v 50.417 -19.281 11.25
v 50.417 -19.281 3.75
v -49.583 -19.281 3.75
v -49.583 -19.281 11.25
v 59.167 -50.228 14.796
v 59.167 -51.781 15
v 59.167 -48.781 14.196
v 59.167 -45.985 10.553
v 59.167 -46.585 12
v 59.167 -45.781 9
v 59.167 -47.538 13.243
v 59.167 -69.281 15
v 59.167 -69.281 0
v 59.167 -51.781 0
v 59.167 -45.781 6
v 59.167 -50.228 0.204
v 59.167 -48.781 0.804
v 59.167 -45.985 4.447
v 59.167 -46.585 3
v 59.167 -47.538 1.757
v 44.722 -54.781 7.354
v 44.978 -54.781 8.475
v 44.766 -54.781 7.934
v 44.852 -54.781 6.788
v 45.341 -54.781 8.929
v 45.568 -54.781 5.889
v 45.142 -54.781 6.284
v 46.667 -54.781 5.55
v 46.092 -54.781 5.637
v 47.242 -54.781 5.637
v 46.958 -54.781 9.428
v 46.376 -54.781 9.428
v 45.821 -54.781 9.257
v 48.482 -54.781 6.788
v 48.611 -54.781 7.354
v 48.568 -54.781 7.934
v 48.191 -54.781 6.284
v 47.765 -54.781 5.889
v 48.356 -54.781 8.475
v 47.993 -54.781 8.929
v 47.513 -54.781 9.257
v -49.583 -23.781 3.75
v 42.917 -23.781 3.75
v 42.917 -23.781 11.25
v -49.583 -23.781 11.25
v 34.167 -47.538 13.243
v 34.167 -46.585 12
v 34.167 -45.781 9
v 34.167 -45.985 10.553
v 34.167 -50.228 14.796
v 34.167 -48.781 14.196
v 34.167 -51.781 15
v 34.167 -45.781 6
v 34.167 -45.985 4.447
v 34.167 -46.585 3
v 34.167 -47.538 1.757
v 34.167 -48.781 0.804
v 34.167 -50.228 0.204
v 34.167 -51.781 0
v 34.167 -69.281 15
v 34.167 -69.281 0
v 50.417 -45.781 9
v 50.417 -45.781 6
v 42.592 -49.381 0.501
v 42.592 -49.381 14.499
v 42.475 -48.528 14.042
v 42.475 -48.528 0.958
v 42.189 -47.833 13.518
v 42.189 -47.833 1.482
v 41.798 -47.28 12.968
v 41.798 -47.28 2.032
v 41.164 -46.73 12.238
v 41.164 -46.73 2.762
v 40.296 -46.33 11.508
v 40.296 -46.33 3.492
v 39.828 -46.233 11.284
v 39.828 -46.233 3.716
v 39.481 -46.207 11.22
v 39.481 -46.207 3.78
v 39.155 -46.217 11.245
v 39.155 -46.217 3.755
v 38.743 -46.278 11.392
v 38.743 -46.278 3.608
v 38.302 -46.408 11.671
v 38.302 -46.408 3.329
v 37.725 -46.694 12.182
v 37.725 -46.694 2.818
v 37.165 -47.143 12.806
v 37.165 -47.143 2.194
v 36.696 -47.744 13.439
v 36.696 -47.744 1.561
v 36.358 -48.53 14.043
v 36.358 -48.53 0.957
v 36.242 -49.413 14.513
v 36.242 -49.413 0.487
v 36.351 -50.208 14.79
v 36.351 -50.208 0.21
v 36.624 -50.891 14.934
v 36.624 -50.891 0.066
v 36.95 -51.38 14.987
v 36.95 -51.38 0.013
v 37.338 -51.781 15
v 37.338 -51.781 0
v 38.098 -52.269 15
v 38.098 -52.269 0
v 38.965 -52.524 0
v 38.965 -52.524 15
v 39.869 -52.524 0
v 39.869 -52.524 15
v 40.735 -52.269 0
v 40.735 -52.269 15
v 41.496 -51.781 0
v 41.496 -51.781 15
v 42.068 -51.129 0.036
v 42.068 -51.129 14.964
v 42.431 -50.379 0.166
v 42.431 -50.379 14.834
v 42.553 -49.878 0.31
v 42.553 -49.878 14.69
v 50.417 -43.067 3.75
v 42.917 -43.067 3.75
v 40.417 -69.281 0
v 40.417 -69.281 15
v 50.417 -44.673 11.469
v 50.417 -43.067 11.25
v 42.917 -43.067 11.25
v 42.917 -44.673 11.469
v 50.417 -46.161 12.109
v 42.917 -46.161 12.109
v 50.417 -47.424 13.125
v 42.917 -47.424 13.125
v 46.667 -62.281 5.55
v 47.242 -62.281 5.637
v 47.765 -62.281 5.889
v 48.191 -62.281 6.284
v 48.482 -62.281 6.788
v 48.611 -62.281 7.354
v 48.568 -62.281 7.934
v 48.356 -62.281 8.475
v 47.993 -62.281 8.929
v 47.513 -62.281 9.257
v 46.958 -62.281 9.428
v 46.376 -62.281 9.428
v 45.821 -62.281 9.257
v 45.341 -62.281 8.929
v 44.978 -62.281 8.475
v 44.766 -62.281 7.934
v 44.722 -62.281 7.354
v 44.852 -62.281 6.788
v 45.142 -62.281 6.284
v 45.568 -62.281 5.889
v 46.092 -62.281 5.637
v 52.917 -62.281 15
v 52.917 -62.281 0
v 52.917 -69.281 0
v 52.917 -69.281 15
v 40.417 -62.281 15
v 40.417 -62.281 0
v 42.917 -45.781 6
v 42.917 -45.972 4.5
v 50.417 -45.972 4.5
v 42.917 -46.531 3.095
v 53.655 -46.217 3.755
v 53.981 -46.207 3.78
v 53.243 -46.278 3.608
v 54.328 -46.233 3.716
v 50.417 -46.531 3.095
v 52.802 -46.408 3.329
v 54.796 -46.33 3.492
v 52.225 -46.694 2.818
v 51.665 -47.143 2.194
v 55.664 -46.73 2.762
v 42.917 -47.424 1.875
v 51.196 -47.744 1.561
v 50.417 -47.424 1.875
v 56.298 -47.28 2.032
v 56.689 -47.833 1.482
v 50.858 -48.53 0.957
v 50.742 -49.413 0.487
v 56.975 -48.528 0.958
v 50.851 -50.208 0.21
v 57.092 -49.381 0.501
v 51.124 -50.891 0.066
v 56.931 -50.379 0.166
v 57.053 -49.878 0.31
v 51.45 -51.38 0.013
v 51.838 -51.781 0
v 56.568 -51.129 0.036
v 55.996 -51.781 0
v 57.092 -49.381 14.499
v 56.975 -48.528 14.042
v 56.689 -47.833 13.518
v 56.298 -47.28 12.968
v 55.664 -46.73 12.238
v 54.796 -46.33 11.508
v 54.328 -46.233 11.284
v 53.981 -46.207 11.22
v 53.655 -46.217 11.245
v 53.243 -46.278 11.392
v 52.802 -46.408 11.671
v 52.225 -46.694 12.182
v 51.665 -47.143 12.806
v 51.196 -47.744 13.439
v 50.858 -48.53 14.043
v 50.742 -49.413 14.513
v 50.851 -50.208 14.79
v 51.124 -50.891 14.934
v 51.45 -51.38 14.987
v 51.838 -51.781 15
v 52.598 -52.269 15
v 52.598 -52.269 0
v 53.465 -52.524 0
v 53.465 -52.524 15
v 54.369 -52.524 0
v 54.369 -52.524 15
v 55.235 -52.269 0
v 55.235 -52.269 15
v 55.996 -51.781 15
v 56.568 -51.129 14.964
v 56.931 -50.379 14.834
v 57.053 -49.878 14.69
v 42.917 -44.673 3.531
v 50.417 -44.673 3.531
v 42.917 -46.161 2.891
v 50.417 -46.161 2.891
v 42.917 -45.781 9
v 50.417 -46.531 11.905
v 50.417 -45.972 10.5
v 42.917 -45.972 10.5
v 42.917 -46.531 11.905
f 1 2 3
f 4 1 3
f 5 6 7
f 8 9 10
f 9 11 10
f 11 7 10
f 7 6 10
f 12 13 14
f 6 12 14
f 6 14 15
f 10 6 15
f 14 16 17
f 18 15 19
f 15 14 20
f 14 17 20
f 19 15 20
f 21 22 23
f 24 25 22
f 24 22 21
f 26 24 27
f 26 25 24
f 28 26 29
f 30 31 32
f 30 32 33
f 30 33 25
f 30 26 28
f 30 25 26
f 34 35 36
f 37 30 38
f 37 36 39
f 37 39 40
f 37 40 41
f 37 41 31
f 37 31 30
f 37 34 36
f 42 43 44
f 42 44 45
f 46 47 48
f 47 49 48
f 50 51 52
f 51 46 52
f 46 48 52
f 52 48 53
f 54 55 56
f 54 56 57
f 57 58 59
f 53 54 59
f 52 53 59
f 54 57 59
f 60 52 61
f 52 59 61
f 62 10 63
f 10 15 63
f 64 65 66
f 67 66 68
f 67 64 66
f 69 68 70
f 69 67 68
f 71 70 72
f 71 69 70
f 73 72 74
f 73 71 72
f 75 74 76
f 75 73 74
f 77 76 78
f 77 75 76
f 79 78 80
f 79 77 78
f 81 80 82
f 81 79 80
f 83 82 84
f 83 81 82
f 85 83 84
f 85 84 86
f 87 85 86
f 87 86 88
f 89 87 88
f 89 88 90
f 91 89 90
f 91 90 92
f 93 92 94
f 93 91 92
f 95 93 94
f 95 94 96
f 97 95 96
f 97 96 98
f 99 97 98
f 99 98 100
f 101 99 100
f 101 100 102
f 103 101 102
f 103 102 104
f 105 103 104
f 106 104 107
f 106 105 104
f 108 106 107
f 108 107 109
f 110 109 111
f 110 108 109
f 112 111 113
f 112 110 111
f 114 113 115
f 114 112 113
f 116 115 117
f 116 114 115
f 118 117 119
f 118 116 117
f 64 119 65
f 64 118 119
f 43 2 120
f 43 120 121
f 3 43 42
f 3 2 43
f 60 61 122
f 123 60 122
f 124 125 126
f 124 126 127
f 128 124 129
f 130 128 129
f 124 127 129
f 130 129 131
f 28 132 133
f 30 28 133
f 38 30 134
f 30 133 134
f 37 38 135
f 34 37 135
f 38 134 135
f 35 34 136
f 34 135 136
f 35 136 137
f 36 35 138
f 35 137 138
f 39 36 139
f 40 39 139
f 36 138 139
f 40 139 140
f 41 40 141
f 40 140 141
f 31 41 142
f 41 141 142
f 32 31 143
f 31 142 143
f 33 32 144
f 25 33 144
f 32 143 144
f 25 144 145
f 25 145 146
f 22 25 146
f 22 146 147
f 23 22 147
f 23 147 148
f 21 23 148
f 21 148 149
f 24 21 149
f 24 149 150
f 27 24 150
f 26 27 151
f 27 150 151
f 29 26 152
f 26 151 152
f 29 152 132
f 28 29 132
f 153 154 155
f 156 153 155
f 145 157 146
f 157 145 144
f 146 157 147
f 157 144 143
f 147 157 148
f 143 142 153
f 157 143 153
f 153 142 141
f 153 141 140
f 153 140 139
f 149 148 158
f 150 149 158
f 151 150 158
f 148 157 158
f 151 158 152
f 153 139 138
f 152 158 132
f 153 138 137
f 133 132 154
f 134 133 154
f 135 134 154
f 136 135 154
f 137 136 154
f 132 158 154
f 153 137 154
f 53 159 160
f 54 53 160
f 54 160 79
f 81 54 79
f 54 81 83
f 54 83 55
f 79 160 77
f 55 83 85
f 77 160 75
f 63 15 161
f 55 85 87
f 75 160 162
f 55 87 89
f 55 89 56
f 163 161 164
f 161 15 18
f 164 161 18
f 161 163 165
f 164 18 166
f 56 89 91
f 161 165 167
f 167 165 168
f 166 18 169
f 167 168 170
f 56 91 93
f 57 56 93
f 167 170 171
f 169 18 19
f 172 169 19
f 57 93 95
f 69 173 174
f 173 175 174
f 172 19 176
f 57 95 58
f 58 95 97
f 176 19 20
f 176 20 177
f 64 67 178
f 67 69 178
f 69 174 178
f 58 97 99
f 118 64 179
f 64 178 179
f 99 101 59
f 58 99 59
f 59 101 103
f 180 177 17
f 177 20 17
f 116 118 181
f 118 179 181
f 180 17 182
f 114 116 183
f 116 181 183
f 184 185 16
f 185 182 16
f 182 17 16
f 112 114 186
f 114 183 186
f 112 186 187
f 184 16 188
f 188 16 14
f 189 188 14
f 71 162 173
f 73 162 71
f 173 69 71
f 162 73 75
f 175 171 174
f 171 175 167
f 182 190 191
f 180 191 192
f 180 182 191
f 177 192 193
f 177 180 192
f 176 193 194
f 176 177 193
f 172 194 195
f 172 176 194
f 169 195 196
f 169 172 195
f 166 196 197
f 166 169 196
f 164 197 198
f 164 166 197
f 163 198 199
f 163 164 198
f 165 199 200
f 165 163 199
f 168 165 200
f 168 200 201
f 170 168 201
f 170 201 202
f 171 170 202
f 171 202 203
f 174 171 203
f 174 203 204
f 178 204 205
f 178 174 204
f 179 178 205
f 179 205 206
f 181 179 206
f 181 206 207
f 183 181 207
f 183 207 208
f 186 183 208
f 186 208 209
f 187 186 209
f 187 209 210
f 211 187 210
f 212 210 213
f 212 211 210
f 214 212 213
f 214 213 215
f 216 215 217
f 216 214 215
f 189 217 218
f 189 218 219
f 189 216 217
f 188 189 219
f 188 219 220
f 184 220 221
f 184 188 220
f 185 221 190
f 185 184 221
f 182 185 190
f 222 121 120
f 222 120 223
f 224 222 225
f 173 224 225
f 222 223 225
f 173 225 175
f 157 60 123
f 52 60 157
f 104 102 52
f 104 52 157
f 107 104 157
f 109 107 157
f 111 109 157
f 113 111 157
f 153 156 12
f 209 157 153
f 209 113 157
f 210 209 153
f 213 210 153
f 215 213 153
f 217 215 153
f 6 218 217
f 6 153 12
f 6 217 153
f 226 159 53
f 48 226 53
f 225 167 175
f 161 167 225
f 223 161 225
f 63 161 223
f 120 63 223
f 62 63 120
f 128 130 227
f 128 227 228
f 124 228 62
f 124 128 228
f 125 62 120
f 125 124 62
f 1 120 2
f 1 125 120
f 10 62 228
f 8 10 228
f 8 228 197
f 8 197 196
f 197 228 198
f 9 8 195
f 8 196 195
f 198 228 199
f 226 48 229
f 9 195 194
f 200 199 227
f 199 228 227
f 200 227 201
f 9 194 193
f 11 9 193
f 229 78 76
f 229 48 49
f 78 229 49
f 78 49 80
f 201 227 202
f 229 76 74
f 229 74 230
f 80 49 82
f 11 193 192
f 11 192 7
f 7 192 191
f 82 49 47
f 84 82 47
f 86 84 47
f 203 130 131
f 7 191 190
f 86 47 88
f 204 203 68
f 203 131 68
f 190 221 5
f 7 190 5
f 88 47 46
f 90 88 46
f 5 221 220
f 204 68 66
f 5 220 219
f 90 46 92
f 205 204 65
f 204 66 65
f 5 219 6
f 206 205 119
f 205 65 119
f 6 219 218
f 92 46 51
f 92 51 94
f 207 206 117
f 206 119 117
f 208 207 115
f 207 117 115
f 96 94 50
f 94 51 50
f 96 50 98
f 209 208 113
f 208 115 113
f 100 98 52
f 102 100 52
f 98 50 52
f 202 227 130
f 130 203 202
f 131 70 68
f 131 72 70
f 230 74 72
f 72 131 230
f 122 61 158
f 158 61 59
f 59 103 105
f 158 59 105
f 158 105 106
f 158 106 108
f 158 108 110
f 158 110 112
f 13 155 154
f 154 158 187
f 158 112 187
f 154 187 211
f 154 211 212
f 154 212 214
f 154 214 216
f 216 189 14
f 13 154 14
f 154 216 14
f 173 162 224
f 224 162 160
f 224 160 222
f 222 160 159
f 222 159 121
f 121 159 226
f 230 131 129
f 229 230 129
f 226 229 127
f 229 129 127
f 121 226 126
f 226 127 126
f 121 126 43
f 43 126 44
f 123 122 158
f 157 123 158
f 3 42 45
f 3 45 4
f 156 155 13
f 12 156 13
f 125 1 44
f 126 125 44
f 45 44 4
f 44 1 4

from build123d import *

# Parameters (mm, degrees)
SKETCH1_R           = 3.175
PUSHER_BASE_DEPTH   = 15
SKETCH3_R           = 1.95
SCREW_HOLE_DEPTH    = 7.5
SKETCH6_W           = 7.5
SKETCH6_H           = 26.5
PUSHER_HEAD_DEPTH   = 3.75
FILLET1_R           = 6
FILLET5_R           = 6
FILLET6_R           = 6
SKETCH8_W           = 92.5
SKETCH8_H           = 4.5
BOSS_EXTRUDE1_DEPTH = 7.5


with BuildPart() as part:
    # Sketch1 → pusher base (new body)
    with BuildSketch(Plane.XY):
        Polygon((59.166899441, -45.781018283), (51.666899441, -45.781018283), (41.666899441, -45.781018283), (34.166899441, -45.781018283), (34.166899441, -69.281018283), (40.416899441, -69.281018283), (40.416899441, -62.281018283), (52.916899441, -62.281018283), (52.916899441, -69.281018283), (59.166899441, -69.281018283), align=None)
        with Locations((39.416899441, -49.381018283)):
            Circle(SKETCH1_R, mode=Mode.SUBTRACT)
        with Locations((53.916899441, -49.381018283)):
            Circle(SKETCH1_R, mode=Mode.SUBTRACT)
    extrude(amount=PUSHER_BASE_DEPTH)

    # Sketch3 → screw hole (cut)
    with BuildSketch(Plane.XZ.offset(62.281018283)):
        with Locations(Location((46.666899441, 7.5, 0), (0, 0, 270))):
            Circle(SKETCH3_R)
    extrude(amount=-SCREW_HOLE_DEPTH, mode=Mode.SUBTRACT)

    # Sketch6 → pusher head (add, symmetric)
    with BuildSketch(Plane.XY.offset(7.5)):
        with Locations((46.666899441, -32.531018283)):
            Rectangle(SKETCH6_W, SKETCH6_H)
    extrude(amount=PUSHER_HEAD_DEPTH, both=True)

    # Fillet1
    # the kernel refuses this fillet: 6 mm, written as the material it takes off along each edge
    with BuildSketch(Plane(origin=(74.166899441, -45.781018283, 0), x_dir=(0, 0, 1), z_dir=(-1, 0, 0))) as fillet1_piece_1_section:
        with BuildLine():
            CenterArc((FILLET1_R, -FILLET1_R), FILLET1_R, 90, 90)
            Line((0, -FILLET1_R), (0, 0))
            Line((0, 0), (FILLET1_R, 0))
        make_face()
    fillet1_piece_1 = extrude(amount=55, mode=Mode.PRIVATE)
    fillet1_piece_1 = split(fillet1_piece_1, bisect_by=Plane(origin=(62.291899441, -45.824840722, 3.75), z_dir=(0, 0, 1)), keep=Keep.TOP, mode=Mode.PRIVATE)
    fillet1_piece_1 = split(fillet1_piece_1, bisect_by=Plane(origin=(50.416899441, -45.824840722, 4.566140917), z_dir=(1, 0, 0)), keep=Keep.TOP, mode=Mode.PRIVATE)
    add(fillet1_piece_1, mode=Mode.SUBTRACT)
    with BuildSketch(Plane(origin=(74.166899441, -45.781018283, 0), x_dir=(0, 0, 1), z_dir=(-1, 0, 0))) as fillet1_piece_2_section:
        with BuildLine():
            CenterArc((FILLET1_R, -FILLET1_R), FILLET1_R, 90, 90)
            Line((0, -FILLET1_R), (0, 0))
            Line((0, 0), (FILLET1_R, 0))
        make_face()
    fillet1_piece_2 = extrude(amount=55, mode=Mode.PRIVATE)
    fillet1_piece_2 = split(fillet1_piece_2, bisect_by=Plane(origin=(62.291899441, -47.230240291, 3.75), z_dir=(0, 0, -1)), keep=Keep.TOP, mode=Mode.PRIVATE)
    fillet1_piece_2 = split(fillet1_piece_2, bisect_by=Plane(origin=(50.416899441, -47.230240291, 1.136674626), z_dir=(1, 0, 0)), keep=Keep.TOP, mode=Mode.PRIVATE)
    add(fillet1_piece_2, mode=Mode.SUBTRACT)
    with BuildSketch(Plane(origin=(74.166899441, -45.781018283, 0), x_dir=(0, 0, 1), z_dir=(-1, 0, 0))) as fillet1_piece_3_section:
        with BuildLine():
            CenterArc((FILLET1_R, -FILLET1_R), FILLET1_R, 90, 90)
            Line((0, -FILLET1_R), (0, 0))
            Line((0, 0), (FILLET1_R, 0))
        make_face()
    fillet1_piece_3 = extrude(amount=55, mode=Mode.PRIVATE)
    fillet1_piece_3 = split(fillet1_piece_3, bisect_by=Plane(origin=(46.666899441, -47.230240291, 3.75), z_dir=(0, 0, -1)), keep=Keep.TOP, mode=Mode.PRIVATE)
    fillet1_piece_3 = split(fillet1_piece_3, bisect_by=Plane(origin=(50.416899441, -47.230240291, 1.136674626), z_dir=(-1, 0, 0)), keep=Keep.TOP, mode=Mode.PRIVATE)
    fillet1_piece_3 = split(fillet1_piece_3, bisect_by=Plane(origin=(42.916899441, -47.230240291, 1.136674626), z_dir=(1, 0, 0)), keep=Keep.TOP, mode=Mode.PRIVATE)
    add(fillet1_piece_3, mode=Mode.SUBTRACT)
    with BuildSketch(Plane(origin=(74.166899441, -45.781018283, 0), x_dir=(0, 0, 1), z_dir=(-1, 0, 0))) as fillet1_piece_4_section:
        with BuildLine():
            CenterArc((FILLET1_R, -FILLET1_R), FILLET1_R, 90, 90)
            Line((0, -FILLET1_R), (0, 0))
            Line((0, 0), (FILLET1_R, 0))
        make_face()
    fillet1_piece_4 = extrude(amount=55, mode=Mode.PRIVATE)
    fillet1_piece_4 = split(fillet1_piece_4, bisect_by=Plane(origin=(31.041899441, -45.824840722, 3.75), z_dir=(0, 0, 1)), keep=Keep.TOP, mode=Mode.PRIVATE)
    fillet1_piece_4 = split(fillet1_piece_4, bisect_by=Plane(origin=(42.916899441, -45.824840722, 4.566140917), z_dir=(-1, 0, 0)), keep=Keep.TOP, mode=Mode.PRIVATE)
    add(fillet1_piece_4, mode=Mode.SUBTRACT)
    with BuildSketch(Plane(origin=(74.166899441, -45.781018283, 0), x_dir=(0, 0, 1), z_dir=(-1, 0, 0))) as fillet1_piece_5_section:
        with BuildLine():
            CenterArc((FILLET1_R, -FILLET1_R), FILLET1_R, 90, 90)
            Line((0, -FILLET1_R), (0, 0))
            Line((0, 0), (FILLET1_R, 0))
        make_face()
    fillet1_piece_5 = extrude(amount=55, mode=Mode.PRIVATE)
    fillet1_piece_5 = split(fillet1_piece_5, bisect_by=Plane(origin=(31.041899441, -47.230240291, 3.75), z_dir=(0, 0, -1)), keep=Keep.TOP, mode=Mode.PRIVATE)
    fillet1_piece_5 = split(fillet1_piece_5, bisect_by=Plane(origin=(42.916899441, -47.230240291, 1.136674626), z_dir=(-1, 0, 0)), keep=Keep.TOP, mode=Mode.PRIVATE)
    add(fillet1_piece_5, mode=Mode.SUBTRACT)
    with BuildSketch(Plane(origin=(19.166899441, -45.781018283, 15), x_dir=(0, 0, -1), z_dir=(1, 0, 0))) as fillet1_piece_6_section:
        with BuildLine():
            CenterArc((FILLET1_R, -FILLET1_R), FILLET1_R, 90, 90)
            Line((0, -FILLET1_R), (0, 0))
            Line((0, 0), (FILLET1_R, 0))
        make_face()
    fillet1_piece_6 = extrude(amount=55, mode=Mode.PRIVATE)
    fillet1_piece_6 = split(fillet1_piece_6, bisect_by=Plane(origin=(31.041899441, -45.824840722, 11.25), z_dir=(0, 0, -1)), keep=Keep.TOP, mode=Mode.PRIVATE)
    fillet1_piece_6 = split(fillet1_piece_6, bisect_by=Plane(origin=(42.916899441, -45.824840722, 10.433859083), z_dir=(-1, 0, 0)), keep=Keep.TOP, mode=Mode.PRIVATE)
    add(fillet1_piece_6, mode=Mode.SUBTRACT)
    with BuildSketch(Plane(origin=(19.166899441, -45.781018283, 15), x_dir=(0, 0, -1), z_dir=(1, 0, 0))) as fillet1_piece_7_section:
        with BuildLine():
            CenterArc((FILLET1_R, -FILLET1_R), FILLET1_R, 90, 90)
            Line((0, -FILLET1_R), (0, 0))
            Line((0, 0), (FILLET1_R, 0))
        make_face()
    fillet1_piece_7 = extrude(amount=55, mode=Mode.PRIVATE)
    fillet1_piece_7 = split(fillet1_piece_7, bisect_by=Plane(origin=(31.041899441, -47.230240291, 11.25), z_dir=(0, 0, 1)), keep=Keep.TOP, mode=Mode.PRIVATE)
    fillet1_piece_7 = split(fillet1_piece_7, bisect_by=Plane(origin=(42.916899441, -47.230240291, 13.863325374), z_dir=(-1, 0, 0)), keep=Keep.TOP, mode=Mode.PRIVATE)
    add(fillet1_piece_7, mode=Mode.SUBTRACT)
    with BuildSketch(Plane(origin=(19.166899441, -45.781018283, 15), x_dir=(0, 0, -1), z_dir=(1, 0, 0))) as fillet1_piece_8_section:
        with BuildLine():
            CenterArc((FILLET1_R, -FILLET1_R), FILLET1_R, 90, 90)
            Line((0, -FILLET1_R), (0, 0))
            Line((0, 0), (FILLET1_R, 0))
        make_face()
    fillet1_piece_8 = extrude(amount=55, mode=Mode.PRIVATE)
    fillet1_piece_8 = split(fillet1_piece_8, bisect_by=Plane(origin=(50.416899441, -47.230240291, 13.863325374), z_dir=(-1, 0, 0)), keep=Keep.TOP, mode=Mode.PRIVATE)
    fillet1_piece_8 = split(fillet1_piece_8, bisect_by=Plane(origin=(46.666899441, -47.230240291, 11.25), z_dir=(0, 0, 1)), keep=Keep.TOP, mode=Mode.PRIVATE)
    fillet1_piece_8 = split(fillet1_piece_8, bisect_by=Plane(origin=(42.916899441, -47.230240291, 13.863325374), z_dir=(1, 0, 0)), keep=Keep.TOP, mode=Mode.PRIVATE)
    add(fillet1_piece_8, mode=Mode.SUBTRACT)
    with BuildSketch(Plane(origin=(19.166899441, -45.781018283, 15), x_dir=(0, 0, -1), z_dir=(1, 0, 0))) as fillet1_piece_9_section:
        with BuildLine():
            CenterArc((FILLET1_R, -FILLET1_R), FILLET1_R, 90, 90)
            Line((0, -FILLET1_R), (0, 0))
            Line((0, 0), (FILLET1_R, 0))
        make_face()
    fillet1_piece_9 = extrude(amount=55, mode=Mode.PRIVATE)
    fillet1_piece_9 = split(fillet1_piece_9, bisect_by=Plane(origin=(50.416899441, -45.824840722, 10.433859083), z_dir=(1, 0, 0)), keep=Keep.TOP, mode=Mode.PRIVATE)
    fillet1_piece_9 = split(fillet1_piece_9, bisect_by=Plane(origin=(62.291899441, -45.824840722, 11.25), z_dir=(0, 0, -1)), keep=Keep.TOP, mode=Mode.PRIVATE)
    add(fillet1_piece_9, mode=Mode.SUBTRACT)
    with BuildSketch(Plane(origin=(19.166899441, -45.781018283, 15), x_dir=(0, 0, -1), z_dir=(1, 0, 0))) as fillet1_piece_10_section:
        with BuildLine():
            CenterArc((FILLET1_R, -FILLET1_R), FILLET1_R, 90, 90)
            Line((0, -FILLET1_R), (0, 0))
            Line((0, 0), (FILLET1_R, 0))
        make_face()
    fillet1_piece_10 = extrude(amount=55, mode=Mode.PRIVATE)
    fillet1_piece_10 = split(fillet1_piece_10, bisect_by=Plane(origin=(50.416899441, -47.230240291, 13.863325374), z_dir=(1, 0, 0)), keep=Keep.TOP, mode=Mode.PRIVATE)
    fillet1_piece_10 = split(fillet1_piece_10, bisect_by=Plane(origin=(62.291899441, -47.230240291, 11.25), z_dir=(0, 0, 1)), keep=Keep.TOP, mode=Mode.PRIVATE)
    add(fillet1_piece_10, mode=Mode.SUBTRACT)

    # Fillet5
    fillet5_edges = [part.edges().sort_by_distance(p)[0] for p in [
        (46.666899441, -46.218869418, 11.25),
    ]]
    fillet(fillet5_edges, radius=FILLET5_R)

    # Fillet6
    fillet6_edges = [part.edges().sort_by_distance(p)[0] for p in [
        (46.666899441, -46.218869418, 3.75),
    ]]
    fillet(fillet6_edges, radius=FILLET6_R)

    # Sketch8 → Boss-Extrude1 (add)
    with BuildSketch(Plane(origin=(0, 0, 3.75), x_dir=(-1, 0, 0), z_dir=(0, 0, -1))):
        with Locations((3.333100559, -21.531018283)):
            Rectangle(SKETCH8_W, SKETCH8_H)
    extrude(amount=-BOSS_EXTRUDE1_DEPTH)


solid = part.part
